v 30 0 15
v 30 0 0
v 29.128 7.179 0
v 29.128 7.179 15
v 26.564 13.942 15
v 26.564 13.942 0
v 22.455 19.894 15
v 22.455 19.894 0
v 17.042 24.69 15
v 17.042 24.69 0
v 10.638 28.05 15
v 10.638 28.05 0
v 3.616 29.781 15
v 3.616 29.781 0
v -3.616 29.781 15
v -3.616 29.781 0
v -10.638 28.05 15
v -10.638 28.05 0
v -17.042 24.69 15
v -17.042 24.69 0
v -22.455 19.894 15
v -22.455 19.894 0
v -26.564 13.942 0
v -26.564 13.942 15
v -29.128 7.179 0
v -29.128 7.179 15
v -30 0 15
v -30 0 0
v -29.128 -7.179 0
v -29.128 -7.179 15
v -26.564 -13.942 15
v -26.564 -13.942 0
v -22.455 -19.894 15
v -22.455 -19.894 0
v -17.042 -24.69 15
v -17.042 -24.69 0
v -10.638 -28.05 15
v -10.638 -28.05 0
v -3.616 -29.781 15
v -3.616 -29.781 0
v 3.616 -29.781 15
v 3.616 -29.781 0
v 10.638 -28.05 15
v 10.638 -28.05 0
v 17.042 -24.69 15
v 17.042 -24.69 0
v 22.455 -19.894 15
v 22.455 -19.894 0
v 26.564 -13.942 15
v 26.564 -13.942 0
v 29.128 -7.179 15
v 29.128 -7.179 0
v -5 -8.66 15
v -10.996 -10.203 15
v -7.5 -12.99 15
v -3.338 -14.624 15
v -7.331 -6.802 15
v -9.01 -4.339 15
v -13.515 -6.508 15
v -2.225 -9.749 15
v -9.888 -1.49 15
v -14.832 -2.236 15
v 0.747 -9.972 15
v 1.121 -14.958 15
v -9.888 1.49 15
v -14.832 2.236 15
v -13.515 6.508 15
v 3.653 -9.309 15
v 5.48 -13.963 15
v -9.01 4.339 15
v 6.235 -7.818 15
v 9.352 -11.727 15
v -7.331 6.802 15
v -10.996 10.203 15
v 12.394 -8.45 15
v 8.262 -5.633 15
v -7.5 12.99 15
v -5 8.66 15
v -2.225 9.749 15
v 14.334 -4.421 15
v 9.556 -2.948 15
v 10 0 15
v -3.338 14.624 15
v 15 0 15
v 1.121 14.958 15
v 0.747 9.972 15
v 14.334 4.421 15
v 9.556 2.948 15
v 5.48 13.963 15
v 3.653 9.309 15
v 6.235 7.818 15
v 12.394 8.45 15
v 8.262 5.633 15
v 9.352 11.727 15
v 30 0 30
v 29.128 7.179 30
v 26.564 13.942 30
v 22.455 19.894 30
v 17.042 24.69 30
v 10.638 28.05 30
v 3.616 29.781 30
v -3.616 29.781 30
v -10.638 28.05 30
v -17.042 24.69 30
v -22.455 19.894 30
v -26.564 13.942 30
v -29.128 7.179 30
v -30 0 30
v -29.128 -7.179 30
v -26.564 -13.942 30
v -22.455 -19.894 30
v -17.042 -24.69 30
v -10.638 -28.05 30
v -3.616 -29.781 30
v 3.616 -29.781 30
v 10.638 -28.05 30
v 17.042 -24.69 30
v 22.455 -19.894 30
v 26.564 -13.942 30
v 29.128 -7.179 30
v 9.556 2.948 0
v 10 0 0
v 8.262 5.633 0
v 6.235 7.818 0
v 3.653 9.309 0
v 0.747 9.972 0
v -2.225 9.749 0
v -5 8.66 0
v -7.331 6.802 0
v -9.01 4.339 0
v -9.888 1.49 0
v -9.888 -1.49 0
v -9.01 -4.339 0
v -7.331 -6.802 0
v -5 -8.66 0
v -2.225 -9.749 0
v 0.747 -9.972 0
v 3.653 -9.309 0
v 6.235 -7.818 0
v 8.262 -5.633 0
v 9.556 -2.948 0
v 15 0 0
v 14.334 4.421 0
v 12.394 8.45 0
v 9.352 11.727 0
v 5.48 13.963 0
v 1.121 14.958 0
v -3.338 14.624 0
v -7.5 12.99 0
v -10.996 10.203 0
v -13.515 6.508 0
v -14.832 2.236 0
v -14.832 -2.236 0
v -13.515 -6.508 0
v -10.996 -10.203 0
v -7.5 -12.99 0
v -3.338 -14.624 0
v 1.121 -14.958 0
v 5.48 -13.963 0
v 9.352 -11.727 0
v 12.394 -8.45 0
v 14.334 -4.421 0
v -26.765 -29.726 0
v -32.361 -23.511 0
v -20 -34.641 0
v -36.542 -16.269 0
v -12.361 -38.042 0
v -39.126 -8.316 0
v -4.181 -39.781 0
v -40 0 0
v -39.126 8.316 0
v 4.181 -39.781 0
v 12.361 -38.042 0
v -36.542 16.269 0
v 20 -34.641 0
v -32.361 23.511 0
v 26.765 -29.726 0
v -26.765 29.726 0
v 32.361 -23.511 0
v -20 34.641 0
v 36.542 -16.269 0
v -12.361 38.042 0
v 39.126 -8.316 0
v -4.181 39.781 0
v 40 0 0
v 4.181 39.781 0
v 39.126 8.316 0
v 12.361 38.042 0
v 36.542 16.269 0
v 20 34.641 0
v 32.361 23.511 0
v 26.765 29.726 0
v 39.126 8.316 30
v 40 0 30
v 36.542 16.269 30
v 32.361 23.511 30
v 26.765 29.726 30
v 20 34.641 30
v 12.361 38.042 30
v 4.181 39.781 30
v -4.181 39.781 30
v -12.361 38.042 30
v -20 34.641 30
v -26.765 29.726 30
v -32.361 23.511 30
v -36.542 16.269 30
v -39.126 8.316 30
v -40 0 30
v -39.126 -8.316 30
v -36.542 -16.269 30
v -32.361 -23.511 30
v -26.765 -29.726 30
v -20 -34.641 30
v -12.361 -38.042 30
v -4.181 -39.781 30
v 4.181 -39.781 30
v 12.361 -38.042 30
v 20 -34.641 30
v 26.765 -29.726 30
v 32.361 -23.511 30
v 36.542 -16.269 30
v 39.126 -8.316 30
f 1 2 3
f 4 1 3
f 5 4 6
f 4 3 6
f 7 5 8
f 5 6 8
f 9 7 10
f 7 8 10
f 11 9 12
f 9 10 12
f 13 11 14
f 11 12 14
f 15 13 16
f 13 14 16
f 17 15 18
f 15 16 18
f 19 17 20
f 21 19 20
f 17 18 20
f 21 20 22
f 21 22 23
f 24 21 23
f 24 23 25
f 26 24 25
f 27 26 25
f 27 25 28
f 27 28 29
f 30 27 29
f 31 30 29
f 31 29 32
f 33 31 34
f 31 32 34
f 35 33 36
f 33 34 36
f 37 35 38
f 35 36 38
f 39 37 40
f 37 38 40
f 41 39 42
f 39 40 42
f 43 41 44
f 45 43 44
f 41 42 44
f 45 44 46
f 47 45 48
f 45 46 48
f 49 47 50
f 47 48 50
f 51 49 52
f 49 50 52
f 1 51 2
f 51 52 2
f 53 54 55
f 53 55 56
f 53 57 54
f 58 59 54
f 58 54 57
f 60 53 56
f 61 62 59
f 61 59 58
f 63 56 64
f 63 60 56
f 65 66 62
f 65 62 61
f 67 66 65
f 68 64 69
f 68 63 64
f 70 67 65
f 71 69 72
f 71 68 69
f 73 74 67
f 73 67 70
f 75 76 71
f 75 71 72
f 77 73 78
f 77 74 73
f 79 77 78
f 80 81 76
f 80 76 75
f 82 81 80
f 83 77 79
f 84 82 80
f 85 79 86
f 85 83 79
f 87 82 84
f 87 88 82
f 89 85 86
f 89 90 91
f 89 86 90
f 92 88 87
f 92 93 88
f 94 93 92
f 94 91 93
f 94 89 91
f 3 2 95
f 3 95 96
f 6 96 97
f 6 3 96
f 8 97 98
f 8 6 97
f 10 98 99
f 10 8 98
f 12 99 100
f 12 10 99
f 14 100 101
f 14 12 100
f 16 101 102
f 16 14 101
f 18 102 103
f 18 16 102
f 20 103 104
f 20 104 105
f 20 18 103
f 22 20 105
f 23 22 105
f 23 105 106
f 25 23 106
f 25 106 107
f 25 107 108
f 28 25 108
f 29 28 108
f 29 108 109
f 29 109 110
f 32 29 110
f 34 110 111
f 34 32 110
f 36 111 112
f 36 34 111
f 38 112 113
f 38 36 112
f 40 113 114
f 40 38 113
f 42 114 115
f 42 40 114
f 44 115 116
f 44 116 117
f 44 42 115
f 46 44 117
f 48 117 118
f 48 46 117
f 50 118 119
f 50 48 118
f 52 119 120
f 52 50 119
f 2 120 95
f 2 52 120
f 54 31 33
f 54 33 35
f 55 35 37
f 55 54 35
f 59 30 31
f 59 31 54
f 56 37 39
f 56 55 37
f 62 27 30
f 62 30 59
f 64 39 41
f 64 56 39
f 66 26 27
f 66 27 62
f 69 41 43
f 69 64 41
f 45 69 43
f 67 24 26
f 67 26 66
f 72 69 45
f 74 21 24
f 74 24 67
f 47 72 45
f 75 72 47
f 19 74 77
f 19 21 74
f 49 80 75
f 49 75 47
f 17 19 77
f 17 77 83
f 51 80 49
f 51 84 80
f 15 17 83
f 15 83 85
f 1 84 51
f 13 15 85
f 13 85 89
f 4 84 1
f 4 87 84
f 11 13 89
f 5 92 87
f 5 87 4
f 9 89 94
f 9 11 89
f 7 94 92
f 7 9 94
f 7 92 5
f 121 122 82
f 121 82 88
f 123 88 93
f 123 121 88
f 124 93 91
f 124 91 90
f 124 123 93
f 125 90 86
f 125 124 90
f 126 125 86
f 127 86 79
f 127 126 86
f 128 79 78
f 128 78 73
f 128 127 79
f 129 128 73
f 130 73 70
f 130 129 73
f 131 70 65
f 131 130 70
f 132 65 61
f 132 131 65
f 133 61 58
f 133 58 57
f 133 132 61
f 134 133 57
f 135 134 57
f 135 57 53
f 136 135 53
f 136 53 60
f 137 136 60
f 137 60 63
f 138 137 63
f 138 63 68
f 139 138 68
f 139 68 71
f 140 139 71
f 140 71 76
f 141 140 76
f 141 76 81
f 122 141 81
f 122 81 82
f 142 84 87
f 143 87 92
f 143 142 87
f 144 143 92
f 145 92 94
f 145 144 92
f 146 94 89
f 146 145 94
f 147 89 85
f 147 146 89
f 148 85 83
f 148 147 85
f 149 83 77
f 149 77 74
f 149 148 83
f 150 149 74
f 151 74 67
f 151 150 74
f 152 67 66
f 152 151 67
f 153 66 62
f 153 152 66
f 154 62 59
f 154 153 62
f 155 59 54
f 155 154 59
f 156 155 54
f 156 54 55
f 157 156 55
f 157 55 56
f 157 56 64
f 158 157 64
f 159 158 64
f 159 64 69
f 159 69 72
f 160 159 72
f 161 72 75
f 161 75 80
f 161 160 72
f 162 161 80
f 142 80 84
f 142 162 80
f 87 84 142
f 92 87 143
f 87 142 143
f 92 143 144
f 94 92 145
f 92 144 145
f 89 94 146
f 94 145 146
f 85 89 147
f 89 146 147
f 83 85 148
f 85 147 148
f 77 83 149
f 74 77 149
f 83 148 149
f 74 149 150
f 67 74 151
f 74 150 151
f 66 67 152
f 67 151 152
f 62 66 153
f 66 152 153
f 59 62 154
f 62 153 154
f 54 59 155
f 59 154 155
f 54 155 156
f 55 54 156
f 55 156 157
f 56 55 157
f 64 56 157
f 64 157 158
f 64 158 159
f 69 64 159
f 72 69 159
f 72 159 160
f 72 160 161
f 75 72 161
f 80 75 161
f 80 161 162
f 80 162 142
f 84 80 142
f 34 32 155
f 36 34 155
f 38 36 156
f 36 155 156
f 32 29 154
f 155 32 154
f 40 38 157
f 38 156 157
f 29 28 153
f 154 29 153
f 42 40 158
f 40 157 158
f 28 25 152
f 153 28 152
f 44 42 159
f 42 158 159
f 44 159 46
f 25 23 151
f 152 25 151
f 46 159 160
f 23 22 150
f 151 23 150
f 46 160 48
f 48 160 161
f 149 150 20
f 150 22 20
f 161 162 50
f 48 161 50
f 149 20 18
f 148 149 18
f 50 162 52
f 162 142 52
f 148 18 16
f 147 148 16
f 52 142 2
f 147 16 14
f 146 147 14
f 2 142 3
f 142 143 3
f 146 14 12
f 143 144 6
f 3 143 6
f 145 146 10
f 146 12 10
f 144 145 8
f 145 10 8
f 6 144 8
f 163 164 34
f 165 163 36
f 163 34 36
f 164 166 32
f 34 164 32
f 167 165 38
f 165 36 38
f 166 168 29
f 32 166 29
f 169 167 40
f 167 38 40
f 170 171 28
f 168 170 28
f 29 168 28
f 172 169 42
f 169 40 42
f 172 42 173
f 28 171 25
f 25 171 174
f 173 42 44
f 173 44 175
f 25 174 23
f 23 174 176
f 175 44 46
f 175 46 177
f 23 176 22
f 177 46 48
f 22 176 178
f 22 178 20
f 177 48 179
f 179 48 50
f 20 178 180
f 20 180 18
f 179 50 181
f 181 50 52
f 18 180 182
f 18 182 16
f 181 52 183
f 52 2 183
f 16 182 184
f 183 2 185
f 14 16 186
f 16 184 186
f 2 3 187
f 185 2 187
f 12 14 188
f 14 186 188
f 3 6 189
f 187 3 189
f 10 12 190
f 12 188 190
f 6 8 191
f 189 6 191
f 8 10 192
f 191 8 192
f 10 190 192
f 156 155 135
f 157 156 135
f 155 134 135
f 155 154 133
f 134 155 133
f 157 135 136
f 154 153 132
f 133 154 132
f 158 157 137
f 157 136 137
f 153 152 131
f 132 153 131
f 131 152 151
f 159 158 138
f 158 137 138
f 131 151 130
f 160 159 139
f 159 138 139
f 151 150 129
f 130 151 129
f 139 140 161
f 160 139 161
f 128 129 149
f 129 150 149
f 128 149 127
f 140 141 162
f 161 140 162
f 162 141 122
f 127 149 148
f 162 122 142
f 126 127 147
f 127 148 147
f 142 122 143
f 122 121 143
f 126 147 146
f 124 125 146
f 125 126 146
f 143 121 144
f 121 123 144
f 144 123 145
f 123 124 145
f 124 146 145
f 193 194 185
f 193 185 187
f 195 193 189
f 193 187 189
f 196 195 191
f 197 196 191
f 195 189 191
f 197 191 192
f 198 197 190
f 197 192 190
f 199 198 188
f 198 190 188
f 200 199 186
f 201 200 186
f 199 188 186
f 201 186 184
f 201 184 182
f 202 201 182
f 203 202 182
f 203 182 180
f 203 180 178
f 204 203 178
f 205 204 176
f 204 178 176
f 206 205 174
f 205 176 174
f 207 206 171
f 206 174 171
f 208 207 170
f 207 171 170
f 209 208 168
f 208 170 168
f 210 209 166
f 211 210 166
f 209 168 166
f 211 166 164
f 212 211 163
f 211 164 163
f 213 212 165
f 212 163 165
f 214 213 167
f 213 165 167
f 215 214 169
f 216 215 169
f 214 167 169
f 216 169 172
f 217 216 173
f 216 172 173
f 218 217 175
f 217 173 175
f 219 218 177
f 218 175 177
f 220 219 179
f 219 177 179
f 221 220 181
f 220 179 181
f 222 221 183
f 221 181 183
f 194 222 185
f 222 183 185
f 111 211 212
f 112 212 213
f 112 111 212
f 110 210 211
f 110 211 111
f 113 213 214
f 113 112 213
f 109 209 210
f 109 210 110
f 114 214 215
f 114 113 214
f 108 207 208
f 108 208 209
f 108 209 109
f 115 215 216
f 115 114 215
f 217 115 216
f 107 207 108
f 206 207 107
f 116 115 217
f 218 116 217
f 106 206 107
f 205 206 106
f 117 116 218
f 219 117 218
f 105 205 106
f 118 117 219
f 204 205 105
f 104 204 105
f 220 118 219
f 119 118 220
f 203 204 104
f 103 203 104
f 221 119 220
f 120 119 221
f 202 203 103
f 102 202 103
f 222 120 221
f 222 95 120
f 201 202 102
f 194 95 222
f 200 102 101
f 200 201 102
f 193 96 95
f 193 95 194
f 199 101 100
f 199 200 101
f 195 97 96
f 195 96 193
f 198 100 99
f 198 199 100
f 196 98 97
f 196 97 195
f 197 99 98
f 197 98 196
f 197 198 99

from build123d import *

# Parameters (mm, degrees)
F0_R        = 40
F0_R_2      = 30
F1_DEPTH    = 30
F0_R_3      = 15
F0_R_4      = 10
F2_DEPTH    = 20
F3_DEPTH    = 15
F2_FACE_R   = 15
F2_FACE_R_2 = 10
F4_DEPTH    = 5


with BuildPart() as f1:
    # F0 (on Top) → F1 (new body)
    with BuildSketch(Plane.XY):
        Circle(F0_R)
        Circle(F0_R_2, mode=Mode.SUBTRACT)
    extrude(amount=F1_DEPTH)


with BuildPart() as f2:
    # F0 (on Top) → F2 (new body)
    with BuildSketch(Plane.XY):
        Circle(F0_R_3)
        Circle(F0_R_4, mode=Mode.SUBTRACT)
    extrude(amount=F2_DEPTH)

    # F2_face (on face) → F4 (cut)
    with BuildSketch(Plane.XY.offset(20)):
        Circle(F2_FACE_R)
        Circle(F2_FACE_R_2, mode=Mode.SUBTRACT)
    extrude(amount=-F4_DEPTH, mode=Mode.SUBTRACT)


with BuildPart() as f3:
    # F0 (on Top) → F3 (new body)
    with BuildSketch(Plane.XY):
        Circle(F0_R_2)
        Circle(F0_R_3, mode=Mode.SUBTRACT)
    extrude(amount=F3_DEPTH)


solid = Compound([f1.part, f2.part, f3.part])
